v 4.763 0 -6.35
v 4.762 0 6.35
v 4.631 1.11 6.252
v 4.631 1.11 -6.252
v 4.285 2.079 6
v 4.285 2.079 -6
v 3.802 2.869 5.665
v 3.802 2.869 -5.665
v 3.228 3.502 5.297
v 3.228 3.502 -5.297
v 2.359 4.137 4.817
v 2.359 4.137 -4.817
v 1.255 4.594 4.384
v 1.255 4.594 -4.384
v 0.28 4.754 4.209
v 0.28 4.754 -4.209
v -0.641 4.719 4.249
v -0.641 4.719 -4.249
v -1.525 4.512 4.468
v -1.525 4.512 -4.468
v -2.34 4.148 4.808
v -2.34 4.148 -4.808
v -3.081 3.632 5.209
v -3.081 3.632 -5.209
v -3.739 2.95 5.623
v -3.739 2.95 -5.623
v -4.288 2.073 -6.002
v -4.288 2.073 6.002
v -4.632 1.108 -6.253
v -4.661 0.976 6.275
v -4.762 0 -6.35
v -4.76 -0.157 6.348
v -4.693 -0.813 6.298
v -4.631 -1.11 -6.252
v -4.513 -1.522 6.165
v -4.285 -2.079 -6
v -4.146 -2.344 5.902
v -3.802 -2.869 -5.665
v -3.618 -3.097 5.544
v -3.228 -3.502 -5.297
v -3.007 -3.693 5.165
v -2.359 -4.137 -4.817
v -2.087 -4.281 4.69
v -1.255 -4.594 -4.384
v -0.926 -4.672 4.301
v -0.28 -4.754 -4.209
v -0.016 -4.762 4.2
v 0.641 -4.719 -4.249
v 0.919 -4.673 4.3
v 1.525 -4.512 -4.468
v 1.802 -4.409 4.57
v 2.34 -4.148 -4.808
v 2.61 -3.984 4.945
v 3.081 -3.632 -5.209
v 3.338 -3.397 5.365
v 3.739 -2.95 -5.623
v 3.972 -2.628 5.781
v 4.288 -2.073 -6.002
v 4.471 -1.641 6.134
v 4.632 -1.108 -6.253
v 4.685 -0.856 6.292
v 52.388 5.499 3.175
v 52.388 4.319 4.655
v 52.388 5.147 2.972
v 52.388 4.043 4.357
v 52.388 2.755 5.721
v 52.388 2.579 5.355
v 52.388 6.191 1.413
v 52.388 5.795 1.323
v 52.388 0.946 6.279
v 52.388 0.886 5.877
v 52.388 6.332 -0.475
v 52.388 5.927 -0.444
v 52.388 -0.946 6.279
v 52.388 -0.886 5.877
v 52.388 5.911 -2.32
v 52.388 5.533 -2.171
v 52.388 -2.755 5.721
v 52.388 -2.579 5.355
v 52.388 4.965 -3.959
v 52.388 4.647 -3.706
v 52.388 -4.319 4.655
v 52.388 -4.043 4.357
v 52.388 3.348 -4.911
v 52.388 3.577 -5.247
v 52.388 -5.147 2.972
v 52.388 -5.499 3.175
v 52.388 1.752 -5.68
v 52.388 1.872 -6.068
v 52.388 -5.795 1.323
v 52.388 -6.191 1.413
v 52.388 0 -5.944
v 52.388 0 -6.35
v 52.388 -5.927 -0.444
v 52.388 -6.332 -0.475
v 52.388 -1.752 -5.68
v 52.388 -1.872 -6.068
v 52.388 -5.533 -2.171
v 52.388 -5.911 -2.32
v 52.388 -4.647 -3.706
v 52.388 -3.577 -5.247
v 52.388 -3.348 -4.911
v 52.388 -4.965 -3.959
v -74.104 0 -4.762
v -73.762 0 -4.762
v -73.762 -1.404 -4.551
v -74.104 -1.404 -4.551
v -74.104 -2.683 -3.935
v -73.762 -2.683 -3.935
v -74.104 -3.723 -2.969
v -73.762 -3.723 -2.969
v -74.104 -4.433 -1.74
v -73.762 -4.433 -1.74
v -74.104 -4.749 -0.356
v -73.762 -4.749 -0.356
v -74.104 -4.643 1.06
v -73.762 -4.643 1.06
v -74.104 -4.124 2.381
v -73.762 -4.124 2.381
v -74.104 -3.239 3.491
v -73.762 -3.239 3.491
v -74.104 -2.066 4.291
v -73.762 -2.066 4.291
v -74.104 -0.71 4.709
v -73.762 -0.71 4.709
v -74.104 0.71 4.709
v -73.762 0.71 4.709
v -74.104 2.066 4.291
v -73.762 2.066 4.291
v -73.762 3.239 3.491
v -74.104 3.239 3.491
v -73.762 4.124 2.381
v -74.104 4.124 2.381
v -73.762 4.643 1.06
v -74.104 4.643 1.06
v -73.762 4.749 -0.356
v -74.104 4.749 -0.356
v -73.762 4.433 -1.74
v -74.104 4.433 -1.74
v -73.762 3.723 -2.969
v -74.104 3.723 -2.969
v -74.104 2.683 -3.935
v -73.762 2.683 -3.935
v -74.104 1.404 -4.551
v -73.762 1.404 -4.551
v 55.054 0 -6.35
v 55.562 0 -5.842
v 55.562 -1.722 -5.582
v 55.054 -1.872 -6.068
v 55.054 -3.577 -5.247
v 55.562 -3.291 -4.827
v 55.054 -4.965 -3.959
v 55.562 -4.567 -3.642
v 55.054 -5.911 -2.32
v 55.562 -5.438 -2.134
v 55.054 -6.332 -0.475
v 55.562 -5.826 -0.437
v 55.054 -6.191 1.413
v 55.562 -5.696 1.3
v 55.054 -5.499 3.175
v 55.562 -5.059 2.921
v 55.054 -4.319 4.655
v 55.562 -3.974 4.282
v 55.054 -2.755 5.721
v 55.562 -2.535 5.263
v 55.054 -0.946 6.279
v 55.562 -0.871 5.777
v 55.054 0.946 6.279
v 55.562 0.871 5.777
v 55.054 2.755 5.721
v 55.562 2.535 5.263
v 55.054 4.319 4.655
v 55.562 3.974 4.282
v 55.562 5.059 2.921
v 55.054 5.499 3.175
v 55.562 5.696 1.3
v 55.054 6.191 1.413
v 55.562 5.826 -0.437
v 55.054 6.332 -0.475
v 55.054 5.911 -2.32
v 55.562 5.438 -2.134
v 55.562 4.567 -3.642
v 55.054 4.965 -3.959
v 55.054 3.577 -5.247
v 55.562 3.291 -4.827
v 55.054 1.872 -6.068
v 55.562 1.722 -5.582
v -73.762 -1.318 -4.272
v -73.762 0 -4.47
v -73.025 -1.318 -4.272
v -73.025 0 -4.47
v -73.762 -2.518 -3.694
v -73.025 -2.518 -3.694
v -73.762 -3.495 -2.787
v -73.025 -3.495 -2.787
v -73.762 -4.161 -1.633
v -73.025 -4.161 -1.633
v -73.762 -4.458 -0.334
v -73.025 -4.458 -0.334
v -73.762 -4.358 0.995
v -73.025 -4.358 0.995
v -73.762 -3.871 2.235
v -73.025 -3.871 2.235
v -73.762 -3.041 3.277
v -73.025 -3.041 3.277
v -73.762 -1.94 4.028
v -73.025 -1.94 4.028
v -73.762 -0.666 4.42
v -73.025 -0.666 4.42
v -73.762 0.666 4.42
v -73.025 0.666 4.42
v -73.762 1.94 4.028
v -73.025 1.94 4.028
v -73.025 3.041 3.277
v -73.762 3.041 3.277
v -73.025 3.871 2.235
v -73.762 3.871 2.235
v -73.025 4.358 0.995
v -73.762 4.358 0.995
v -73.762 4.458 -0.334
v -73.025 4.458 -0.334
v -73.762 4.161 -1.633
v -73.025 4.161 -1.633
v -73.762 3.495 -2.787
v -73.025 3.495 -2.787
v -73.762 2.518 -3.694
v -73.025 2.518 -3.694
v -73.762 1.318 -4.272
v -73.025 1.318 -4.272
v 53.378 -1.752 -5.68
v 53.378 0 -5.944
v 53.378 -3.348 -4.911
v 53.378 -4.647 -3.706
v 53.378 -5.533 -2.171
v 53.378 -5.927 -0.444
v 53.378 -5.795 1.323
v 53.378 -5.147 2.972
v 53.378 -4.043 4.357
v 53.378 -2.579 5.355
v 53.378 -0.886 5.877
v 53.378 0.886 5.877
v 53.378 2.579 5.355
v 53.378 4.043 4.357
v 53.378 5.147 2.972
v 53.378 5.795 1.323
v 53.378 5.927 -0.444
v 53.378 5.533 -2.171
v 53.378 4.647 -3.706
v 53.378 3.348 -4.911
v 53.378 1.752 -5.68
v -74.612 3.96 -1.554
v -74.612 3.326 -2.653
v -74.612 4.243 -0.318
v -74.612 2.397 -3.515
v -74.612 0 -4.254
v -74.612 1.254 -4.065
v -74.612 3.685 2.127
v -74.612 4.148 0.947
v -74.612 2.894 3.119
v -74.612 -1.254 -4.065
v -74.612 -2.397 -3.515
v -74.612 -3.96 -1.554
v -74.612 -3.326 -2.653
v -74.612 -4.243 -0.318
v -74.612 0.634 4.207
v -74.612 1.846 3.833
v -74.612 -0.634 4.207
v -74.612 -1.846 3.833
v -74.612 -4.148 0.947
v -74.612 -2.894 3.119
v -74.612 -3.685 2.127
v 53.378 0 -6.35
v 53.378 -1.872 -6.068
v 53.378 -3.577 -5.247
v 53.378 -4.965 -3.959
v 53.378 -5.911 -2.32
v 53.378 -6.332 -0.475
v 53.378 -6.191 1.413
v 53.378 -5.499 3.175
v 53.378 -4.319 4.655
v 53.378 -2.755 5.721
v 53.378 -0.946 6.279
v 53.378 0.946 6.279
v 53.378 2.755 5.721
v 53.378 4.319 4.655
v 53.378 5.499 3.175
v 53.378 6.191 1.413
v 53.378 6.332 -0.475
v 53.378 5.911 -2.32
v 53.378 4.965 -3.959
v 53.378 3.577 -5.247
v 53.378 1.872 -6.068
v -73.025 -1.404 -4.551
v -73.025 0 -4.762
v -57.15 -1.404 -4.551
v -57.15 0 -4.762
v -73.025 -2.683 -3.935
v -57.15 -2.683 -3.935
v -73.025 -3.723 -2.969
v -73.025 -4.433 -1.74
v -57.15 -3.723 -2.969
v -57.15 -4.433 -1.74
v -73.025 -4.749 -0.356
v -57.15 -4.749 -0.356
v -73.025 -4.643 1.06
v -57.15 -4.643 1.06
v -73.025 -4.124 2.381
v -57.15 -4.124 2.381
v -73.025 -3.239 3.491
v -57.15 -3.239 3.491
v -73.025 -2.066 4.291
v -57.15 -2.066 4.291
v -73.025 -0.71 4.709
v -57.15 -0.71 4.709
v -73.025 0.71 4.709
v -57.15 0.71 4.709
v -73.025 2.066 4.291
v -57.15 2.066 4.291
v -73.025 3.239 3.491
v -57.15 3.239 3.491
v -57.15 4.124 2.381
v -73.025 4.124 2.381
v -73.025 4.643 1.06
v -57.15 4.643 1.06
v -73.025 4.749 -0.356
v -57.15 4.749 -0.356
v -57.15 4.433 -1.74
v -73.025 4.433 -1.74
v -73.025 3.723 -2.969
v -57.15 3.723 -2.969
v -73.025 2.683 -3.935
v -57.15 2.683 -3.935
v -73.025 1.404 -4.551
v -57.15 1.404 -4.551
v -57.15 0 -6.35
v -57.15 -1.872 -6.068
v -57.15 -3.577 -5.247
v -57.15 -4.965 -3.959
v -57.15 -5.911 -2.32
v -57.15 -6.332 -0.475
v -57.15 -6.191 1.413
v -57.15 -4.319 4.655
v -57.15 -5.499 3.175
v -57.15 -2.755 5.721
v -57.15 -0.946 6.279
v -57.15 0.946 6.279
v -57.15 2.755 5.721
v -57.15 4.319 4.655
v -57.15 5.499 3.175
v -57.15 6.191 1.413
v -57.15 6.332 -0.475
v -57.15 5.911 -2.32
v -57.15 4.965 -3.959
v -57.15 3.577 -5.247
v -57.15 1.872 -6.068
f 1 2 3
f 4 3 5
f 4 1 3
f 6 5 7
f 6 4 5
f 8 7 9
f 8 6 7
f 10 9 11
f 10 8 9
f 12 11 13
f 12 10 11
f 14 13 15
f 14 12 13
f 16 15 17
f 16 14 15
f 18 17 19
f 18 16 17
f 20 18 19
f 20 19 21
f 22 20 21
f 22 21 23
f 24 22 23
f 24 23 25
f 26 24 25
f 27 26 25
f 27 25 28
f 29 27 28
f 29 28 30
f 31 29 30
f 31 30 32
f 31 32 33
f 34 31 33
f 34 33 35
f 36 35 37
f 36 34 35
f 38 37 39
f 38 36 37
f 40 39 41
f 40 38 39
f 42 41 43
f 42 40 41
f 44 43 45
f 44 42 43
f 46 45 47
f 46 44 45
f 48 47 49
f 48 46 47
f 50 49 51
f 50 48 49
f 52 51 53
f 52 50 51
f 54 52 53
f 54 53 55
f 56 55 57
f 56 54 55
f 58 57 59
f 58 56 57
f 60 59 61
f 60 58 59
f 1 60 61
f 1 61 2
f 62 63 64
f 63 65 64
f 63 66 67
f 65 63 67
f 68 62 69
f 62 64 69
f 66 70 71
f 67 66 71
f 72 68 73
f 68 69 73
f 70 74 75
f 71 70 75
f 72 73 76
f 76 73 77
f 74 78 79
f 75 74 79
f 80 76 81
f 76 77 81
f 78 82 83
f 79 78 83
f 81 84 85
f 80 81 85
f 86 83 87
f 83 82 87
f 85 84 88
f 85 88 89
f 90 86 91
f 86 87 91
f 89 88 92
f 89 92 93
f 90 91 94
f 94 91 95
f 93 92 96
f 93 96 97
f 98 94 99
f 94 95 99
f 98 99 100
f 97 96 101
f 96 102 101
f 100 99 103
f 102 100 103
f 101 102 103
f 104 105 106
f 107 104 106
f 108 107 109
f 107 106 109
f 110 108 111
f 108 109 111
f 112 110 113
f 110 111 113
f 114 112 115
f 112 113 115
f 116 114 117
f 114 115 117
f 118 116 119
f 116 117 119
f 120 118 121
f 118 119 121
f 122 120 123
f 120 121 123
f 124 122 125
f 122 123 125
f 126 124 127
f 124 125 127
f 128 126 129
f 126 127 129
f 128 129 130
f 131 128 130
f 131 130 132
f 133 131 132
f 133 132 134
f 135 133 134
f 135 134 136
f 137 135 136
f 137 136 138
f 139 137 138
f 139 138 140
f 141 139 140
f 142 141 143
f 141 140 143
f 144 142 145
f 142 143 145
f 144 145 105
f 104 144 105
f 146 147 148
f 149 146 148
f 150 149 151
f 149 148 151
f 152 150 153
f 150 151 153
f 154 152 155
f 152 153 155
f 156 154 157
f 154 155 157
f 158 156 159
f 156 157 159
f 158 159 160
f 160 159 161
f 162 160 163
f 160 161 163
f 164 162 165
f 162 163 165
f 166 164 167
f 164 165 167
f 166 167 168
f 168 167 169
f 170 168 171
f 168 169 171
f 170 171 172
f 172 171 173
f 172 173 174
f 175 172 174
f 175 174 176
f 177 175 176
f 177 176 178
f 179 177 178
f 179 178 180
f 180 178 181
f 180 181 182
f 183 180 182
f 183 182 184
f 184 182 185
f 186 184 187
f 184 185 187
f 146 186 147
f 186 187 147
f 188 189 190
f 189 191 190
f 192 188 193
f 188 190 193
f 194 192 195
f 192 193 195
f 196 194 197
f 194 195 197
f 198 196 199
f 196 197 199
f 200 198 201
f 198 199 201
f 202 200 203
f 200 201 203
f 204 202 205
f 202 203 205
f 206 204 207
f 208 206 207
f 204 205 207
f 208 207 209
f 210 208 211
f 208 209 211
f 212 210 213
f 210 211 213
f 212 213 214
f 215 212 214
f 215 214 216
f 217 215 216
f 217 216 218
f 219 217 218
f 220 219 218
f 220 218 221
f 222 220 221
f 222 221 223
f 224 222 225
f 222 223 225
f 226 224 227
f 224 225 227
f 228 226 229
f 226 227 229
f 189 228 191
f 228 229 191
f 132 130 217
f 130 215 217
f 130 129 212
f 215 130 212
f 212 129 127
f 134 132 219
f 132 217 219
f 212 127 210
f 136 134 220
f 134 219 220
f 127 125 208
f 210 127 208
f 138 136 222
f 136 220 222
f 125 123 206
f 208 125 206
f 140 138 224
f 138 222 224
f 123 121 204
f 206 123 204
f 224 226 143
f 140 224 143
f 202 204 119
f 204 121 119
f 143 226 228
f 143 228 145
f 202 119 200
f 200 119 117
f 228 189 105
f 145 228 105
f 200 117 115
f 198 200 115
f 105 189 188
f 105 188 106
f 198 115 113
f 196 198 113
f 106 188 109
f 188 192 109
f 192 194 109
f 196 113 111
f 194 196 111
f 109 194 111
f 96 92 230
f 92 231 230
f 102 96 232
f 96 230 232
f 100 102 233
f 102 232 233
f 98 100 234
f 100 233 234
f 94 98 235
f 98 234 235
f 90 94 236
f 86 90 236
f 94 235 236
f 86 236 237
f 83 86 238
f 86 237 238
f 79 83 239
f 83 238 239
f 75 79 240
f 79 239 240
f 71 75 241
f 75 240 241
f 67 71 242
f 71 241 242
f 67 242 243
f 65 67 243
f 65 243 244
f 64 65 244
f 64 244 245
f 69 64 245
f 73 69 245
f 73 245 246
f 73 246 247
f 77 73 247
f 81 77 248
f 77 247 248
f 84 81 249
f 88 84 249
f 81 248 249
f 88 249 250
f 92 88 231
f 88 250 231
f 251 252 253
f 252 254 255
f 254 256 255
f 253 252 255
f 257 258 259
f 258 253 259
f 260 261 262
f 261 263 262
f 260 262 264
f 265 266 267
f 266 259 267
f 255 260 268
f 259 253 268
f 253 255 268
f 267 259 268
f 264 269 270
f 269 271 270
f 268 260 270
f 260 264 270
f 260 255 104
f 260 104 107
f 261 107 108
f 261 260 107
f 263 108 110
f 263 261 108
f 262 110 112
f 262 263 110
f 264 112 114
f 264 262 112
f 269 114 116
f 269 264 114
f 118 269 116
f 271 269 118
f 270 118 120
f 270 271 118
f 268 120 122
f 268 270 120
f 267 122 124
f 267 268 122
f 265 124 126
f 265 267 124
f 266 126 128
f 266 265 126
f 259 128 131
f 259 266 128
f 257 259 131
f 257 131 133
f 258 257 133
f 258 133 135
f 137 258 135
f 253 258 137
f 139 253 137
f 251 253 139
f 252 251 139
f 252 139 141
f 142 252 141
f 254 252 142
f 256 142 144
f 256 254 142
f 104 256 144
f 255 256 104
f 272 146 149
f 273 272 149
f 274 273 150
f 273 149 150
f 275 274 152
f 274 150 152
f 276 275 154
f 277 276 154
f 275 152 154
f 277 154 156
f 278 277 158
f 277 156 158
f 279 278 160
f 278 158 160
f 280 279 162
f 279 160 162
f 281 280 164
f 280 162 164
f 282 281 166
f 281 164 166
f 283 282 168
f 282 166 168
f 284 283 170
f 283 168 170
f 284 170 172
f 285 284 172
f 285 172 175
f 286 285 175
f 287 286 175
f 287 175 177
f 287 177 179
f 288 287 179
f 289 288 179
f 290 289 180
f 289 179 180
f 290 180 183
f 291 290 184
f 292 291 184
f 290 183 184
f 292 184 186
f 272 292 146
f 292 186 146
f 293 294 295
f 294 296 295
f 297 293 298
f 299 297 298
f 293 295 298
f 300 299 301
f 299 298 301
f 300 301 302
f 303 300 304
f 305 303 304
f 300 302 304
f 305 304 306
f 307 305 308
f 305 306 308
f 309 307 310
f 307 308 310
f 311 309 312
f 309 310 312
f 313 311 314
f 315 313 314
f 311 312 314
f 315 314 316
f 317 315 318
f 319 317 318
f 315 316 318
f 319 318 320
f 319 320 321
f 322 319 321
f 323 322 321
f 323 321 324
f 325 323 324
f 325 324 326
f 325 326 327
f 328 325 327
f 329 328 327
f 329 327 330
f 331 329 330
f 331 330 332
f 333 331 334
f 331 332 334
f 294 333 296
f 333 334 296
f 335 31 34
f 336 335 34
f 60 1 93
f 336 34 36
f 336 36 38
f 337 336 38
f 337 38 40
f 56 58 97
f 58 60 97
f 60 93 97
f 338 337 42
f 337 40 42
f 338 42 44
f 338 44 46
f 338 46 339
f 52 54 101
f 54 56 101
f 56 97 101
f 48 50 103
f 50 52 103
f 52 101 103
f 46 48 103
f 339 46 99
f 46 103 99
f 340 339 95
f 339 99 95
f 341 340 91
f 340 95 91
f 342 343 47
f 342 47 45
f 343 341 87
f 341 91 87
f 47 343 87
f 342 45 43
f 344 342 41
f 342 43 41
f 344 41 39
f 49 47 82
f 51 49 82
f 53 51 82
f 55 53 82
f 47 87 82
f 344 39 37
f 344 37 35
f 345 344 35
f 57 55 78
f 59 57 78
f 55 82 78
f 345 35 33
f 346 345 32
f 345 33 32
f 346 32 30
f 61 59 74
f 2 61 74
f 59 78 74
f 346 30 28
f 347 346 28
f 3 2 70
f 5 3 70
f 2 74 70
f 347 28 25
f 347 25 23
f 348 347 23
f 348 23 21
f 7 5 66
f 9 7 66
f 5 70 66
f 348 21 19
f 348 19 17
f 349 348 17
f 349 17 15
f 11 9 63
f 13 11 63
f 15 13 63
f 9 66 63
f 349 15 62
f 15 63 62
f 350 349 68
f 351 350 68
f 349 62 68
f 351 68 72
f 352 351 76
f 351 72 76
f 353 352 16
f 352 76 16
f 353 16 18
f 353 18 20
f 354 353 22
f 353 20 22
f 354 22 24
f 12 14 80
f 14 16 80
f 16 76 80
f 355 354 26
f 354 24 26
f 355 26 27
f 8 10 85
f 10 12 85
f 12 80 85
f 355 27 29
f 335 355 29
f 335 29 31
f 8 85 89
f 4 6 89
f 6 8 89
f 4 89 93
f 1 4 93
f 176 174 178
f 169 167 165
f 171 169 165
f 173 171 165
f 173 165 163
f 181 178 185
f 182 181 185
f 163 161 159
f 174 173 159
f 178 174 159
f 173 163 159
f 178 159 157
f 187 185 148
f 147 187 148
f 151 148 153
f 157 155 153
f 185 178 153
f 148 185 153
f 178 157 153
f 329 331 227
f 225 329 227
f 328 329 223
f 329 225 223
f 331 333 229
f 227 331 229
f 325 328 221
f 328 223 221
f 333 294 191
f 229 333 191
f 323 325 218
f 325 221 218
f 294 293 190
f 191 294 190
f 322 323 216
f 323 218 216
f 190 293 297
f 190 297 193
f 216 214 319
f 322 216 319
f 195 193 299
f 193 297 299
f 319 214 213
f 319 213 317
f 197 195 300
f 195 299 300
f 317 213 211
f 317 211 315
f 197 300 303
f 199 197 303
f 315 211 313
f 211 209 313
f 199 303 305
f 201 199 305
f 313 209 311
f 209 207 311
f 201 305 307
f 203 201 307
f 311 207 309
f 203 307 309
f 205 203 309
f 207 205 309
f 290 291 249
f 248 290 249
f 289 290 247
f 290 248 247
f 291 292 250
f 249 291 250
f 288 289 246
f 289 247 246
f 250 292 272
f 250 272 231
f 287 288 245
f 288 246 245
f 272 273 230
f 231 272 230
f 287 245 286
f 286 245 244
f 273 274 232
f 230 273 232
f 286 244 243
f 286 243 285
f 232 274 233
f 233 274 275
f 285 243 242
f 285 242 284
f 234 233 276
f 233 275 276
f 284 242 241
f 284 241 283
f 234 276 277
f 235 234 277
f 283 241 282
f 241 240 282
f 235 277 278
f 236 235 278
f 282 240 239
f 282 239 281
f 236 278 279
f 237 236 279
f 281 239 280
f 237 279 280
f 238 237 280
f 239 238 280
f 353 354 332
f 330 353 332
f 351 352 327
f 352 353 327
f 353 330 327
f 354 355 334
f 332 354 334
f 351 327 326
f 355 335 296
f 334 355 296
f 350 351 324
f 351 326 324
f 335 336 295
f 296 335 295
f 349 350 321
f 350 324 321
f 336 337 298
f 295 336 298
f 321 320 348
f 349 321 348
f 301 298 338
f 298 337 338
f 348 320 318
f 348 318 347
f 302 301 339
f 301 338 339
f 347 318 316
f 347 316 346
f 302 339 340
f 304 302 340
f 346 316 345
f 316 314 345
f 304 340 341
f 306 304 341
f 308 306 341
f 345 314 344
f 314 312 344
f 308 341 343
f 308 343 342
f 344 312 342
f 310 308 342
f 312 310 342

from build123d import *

# Parameters (mm, degrees)
CUT_EXTRUDE1_DEPTH      = 76.150982404
CUT_EXTRUDE1_DEPTH_BACK = 76.150982404
SKETCH2_R               = 4.7625
CHAMFER1_SIZE           = 0.508


with BuildPart() as part:
    # Sketch1 → Revolve1 (revolve)
    with BuildSketch(Plane.XY, mode=Mode.PRIVATE) as revolve1_sk:
        Polygon((-57.15, 6.35), (52.3875, 6.35), (52.3875, 5.9436), (53.3781, 5.9436), (53.3781, 6.35), (55.5625, 6.35), (55.5625, 0), (-74.6125, 0), (-74.6125, 4.7625), (-73.7616, 4.7625), (-73.7616, 4.4704), (-73.025, 4.4704), (-73.025, 4.7625), (-57.15, 4.7625), align=None)
    revolve(revolve1_sk.sketch.rotate(Axis((0, 0, 0), (-1, 0, 0)), 90), axis=Axis((0, 0, 0), (-1, 0, 0)))

    # Sketch2 → Cut-Extrude1 (cut, two sides: drawn at the far end of the back side and taken through both)
    with BuildSketch(Plane.XY.offset(-CUT_EXTRUDE1_DEPTH_BACK)):
        Circle(SKETCH2_R)
    extrude(amount=CUT_EXTRUDE1_DEPTH + CUT_EXTRUDE1_DEPTH_BACK, mode=Mode.SUBTRACT)

    # Chamfer1
    chamfer1_edges = [part.edges().sort_by_distance(p)[0] for p in [
        (-74.6125, 0, 4.7625),
        (55.5625, 0, 6.35),
    ]]
    chamfer(chamfer1_edges, length=CHAMFER1_SIZE)


solid = part.part
